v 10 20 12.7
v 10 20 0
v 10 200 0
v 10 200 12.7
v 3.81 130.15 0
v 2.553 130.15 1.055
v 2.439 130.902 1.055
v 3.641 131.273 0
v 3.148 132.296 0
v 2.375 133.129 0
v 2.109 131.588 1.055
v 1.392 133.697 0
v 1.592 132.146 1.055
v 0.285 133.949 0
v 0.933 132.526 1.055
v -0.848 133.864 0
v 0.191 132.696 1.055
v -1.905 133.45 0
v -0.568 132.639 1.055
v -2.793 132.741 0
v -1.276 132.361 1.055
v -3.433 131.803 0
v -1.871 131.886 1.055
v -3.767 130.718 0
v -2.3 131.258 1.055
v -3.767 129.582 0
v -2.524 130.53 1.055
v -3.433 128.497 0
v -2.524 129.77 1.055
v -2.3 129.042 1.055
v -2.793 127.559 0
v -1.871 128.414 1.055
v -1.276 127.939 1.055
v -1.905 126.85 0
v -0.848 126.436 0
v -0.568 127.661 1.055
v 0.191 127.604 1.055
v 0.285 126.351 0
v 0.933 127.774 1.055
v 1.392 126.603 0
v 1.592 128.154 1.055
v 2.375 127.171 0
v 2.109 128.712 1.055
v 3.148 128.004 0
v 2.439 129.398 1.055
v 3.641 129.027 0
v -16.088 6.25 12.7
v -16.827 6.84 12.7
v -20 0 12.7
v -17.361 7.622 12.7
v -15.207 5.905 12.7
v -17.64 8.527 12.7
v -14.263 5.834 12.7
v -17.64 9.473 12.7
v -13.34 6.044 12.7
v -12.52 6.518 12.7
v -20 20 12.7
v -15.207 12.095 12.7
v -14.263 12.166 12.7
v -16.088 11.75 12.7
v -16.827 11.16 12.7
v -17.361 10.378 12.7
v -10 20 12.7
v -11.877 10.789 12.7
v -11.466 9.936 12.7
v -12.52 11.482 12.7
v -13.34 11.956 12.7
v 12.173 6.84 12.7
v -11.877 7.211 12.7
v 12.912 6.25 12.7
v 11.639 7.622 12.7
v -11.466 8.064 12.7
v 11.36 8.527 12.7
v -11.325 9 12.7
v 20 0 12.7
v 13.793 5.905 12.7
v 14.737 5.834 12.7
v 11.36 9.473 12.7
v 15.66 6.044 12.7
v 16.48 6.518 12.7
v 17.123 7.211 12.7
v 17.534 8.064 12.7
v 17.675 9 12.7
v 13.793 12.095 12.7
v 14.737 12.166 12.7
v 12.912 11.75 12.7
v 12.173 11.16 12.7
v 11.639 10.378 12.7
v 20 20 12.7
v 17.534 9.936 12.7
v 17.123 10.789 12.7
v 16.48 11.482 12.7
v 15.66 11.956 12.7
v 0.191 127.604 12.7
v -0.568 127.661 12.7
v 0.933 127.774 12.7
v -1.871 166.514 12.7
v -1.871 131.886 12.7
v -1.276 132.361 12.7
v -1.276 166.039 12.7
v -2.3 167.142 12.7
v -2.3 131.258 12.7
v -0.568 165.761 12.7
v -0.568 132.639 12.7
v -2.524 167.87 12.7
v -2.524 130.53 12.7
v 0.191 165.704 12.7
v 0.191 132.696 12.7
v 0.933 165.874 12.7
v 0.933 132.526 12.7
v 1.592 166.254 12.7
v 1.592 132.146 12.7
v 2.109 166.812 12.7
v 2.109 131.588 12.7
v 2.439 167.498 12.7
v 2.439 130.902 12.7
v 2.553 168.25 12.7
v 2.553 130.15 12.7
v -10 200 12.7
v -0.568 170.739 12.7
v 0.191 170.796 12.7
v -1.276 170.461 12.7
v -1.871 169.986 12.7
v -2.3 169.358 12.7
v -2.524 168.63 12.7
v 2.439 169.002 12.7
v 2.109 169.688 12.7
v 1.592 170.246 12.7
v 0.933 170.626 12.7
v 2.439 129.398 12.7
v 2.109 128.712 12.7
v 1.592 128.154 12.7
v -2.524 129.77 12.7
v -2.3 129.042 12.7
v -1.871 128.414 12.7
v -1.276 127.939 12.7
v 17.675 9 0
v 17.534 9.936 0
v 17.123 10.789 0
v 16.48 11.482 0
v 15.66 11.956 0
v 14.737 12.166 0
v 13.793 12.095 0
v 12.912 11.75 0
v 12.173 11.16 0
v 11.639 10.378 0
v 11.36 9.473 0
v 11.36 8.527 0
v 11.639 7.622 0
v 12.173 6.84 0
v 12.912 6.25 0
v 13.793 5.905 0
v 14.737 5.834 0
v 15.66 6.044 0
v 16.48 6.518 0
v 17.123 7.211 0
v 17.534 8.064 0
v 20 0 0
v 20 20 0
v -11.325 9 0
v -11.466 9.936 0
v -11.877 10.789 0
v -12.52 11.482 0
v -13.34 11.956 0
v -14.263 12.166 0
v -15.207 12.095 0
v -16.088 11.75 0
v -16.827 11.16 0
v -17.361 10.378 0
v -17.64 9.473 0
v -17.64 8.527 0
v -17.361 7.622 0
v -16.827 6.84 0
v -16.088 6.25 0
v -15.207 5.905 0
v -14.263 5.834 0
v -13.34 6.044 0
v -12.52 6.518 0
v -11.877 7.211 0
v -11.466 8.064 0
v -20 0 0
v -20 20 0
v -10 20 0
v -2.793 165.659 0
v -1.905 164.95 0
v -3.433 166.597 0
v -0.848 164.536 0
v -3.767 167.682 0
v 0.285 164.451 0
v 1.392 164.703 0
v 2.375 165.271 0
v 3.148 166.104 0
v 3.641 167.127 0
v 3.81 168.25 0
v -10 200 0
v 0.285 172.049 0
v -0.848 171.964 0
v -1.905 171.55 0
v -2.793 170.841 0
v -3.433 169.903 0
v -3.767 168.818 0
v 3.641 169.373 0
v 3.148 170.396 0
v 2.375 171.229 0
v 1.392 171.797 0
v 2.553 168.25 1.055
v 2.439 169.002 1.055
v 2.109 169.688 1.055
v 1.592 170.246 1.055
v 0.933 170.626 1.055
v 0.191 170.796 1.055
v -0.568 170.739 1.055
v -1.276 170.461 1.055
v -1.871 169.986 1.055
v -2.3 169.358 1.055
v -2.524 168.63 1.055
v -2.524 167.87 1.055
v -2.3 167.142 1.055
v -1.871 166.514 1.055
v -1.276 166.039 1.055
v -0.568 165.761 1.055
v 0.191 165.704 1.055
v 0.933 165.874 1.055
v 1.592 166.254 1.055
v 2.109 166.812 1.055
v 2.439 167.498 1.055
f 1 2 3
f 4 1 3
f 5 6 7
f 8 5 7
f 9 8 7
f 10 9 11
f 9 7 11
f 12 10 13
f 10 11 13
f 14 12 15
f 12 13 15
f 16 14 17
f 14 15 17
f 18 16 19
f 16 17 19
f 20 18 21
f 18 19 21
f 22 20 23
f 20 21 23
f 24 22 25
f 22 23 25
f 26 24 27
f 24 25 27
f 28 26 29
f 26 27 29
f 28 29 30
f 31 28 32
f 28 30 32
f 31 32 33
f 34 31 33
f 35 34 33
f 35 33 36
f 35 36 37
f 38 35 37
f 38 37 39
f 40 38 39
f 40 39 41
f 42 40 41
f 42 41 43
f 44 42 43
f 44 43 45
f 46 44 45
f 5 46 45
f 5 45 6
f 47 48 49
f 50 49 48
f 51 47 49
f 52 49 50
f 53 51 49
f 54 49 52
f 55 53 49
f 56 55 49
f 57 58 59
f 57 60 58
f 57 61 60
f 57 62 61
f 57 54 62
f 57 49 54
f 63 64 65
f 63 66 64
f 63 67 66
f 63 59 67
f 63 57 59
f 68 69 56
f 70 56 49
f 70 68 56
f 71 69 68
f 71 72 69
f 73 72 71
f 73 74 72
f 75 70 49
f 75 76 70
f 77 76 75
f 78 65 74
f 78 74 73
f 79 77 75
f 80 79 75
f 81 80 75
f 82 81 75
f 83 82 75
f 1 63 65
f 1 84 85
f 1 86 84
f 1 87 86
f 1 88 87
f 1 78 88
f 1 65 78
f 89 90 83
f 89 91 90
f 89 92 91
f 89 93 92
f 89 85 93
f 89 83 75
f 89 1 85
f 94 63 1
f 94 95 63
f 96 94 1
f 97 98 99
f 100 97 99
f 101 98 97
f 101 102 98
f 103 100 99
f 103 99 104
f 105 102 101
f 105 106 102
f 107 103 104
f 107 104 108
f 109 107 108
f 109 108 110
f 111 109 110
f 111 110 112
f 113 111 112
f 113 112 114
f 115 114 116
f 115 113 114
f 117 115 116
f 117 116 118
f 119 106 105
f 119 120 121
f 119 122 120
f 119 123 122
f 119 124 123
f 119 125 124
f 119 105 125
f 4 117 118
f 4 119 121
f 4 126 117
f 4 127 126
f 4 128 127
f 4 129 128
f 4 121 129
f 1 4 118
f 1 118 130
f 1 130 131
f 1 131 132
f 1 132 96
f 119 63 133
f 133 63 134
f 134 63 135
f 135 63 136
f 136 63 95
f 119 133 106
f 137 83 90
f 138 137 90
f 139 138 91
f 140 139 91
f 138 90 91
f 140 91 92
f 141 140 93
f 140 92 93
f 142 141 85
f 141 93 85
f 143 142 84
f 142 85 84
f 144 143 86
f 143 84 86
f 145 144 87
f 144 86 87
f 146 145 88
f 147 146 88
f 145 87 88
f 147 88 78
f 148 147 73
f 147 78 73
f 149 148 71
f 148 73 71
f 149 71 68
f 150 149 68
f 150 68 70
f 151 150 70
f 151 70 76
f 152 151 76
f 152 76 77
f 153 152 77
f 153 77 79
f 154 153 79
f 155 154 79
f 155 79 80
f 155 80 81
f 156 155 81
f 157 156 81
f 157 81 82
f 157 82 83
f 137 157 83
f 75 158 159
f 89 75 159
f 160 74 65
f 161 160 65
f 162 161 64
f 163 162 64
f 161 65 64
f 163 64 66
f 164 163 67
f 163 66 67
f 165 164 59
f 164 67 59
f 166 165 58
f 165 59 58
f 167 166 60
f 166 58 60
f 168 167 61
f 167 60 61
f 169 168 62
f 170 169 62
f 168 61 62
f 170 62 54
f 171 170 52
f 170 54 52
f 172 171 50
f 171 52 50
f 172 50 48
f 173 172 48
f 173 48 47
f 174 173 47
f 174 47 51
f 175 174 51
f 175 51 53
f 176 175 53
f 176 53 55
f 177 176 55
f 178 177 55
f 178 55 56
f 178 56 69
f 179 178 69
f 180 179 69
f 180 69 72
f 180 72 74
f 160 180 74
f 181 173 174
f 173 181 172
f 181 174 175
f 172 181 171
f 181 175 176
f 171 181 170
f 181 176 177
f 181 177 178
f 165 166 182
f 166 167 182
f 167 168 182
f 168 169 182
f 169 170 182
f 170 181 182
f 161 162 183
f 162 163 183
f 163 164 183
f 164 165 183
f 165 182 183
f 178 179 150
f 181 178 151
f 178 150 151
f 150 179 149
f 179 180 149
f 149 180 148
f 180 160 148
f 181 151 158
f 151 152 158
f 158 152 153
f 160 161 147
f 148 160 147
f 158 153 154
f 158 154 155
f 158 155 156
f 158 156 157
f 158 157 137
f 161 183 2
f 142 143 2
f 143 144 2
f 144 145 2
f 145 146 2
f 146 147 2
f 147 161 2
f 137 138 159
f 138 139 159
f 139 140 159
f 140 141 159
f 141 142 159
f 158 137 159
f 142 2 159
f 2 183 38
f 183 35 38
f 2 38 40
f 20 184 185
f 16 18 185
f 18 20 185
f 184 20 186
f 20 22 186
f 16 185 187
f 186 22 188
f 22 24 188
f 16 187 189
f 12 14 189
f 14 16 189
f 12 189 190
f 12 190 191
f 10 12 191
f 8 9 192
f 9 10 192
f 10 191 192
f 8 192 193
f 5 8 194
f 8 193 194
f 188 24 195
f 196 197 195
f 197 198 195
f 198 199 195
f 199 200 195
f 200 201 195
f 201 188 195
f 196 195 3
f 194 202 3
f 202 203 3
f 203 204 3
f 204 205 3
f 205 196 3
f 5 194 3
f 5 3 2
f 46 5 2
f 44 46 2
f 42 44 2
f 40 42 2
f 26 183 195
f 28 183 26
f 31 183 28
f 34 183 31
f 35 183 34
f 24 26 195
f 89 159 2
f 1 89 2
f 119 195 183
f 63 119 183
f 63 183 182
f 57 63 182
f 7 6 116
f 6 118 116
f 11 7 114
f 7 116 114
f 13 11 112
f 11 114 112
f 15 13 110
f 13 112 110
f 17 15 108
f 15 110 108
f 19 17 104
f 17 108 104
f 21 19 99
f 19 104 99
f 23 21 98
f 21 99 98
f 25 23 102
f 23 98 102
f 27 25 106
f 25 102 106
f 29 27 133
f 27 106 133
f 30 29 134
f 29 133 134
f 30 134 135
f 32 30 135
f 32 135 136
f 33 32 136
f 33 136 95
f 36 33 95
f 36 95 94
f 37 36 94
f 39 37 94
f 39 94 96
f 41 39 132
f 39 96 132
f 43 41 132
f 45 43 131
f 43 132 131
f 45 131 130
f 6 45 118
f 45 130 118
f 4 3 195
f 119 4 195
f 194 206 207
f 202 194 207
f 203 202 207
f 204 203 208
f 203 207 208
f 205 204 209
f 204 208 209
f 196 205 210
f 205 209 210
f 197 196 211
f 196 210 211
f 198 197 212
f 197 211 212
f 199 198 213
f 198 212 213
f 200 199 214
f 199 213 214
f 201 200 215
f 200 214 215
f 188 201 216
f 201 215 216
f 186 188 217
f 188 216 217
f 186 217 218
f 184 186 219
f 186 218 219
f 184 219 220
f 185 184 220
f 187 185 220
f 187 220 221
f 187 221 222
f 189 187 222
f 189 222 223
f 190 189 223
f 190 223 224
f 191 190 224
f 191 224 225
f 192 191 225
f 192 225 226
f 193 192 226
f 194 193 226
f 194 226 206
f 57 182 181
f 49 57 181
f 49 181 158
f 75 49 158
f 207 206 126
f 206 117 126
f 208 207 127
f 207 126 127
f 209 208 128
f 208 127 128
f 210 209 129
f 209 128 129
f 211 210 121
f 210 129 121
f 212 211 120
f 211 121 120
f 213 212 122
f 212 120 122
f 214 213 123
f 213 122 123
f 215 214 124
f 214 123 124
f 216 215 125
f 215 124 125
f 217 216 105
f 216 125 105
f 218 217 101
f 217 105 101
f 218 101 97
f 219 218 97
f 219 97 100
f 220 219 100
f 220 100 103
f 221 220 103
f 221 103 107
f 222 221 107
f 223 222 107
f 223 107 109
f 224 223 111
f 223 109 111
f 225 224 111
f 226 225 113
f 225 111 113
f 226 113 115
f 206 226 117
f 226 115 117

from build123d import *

# Parameters (mm, degrees)
BOSS_EXTRUDE1_DEPTH               = 12.7
F_1_4_20_TAPPED_HOLE1_D           = 5.1054
F_1_4_20_TAPPED_HOLE1_CSINK_D     = 7.62
F_1_4_20_TAPPED_HOLE1_CSINK_ANGLE = 100
F_1_4_0_25_DIAMETER_HOLE1_D       = 6.35
F_1_4_0_25_DIAMETER_HOLE1_DEPTH   = 19.05
F_1_4_0_25_DIAMETER_HOLE1_TIP     = 1.907732465


with BuildPart() as part:
    # Sketch1 → Boss-Extrude1 (new body)
    with BuildSketch(Plane.XY):
        Polygon((-20, 0), (20, 0), (20, 20), (10, 20), (10, 200), (-10, 200), (-10, 20), (-20, 20), align=None)
    extrude(amount=BOSS_EXTRUDE1_DEPTH)

    # 1/4-20 Tapped Hole1 (through all)
    with Locations(Plane(origin=(0, 0, 0), x_dir=(-1, 0, 0), z_dir=(0, 0, -1))):
        with Locations((0, 168.25), (0, 130.15)):
            CounterSinkHole(F_1_4_20_TAPPED_HOLE1_D / 2, F_1_4_20_TAPPED_HOLE1_CSINK_D / 2, counter_sink_angle=F_1_4_20_TAPPED_HOLE1_CSINK_ANGLE)

    # 1/4 (0.25) Diameter Hole1
    with Locations(Plane(origin=(0, 0, 0), x_dir=(-1, 0, 0), z_dir=(0, 0, -1))):
        with Locations((14.5, 9), (-14.5, 9)):
            Hole(F_1_4_0_25_DIAMETER_HOLE1_D / 2, depth=F_1_4_0_25_DIAMETER_HOLE1_DEPTH)
            with Locations((0, 0, -(F_1_4_0_25_DIAMETER_HOLE1_DEPTH + F_1_4_0_25_DIAMETER_HOLE1_TIP / 2))):  # 118° drill point
                Cone(0, F_1_4_0_25_DIAMETER_HOLE1_D / 2, F_1_4_0_25_DIAMETER_HOLE1_TIP, mode=Mode.SUBTRACT)


solid = part.part
